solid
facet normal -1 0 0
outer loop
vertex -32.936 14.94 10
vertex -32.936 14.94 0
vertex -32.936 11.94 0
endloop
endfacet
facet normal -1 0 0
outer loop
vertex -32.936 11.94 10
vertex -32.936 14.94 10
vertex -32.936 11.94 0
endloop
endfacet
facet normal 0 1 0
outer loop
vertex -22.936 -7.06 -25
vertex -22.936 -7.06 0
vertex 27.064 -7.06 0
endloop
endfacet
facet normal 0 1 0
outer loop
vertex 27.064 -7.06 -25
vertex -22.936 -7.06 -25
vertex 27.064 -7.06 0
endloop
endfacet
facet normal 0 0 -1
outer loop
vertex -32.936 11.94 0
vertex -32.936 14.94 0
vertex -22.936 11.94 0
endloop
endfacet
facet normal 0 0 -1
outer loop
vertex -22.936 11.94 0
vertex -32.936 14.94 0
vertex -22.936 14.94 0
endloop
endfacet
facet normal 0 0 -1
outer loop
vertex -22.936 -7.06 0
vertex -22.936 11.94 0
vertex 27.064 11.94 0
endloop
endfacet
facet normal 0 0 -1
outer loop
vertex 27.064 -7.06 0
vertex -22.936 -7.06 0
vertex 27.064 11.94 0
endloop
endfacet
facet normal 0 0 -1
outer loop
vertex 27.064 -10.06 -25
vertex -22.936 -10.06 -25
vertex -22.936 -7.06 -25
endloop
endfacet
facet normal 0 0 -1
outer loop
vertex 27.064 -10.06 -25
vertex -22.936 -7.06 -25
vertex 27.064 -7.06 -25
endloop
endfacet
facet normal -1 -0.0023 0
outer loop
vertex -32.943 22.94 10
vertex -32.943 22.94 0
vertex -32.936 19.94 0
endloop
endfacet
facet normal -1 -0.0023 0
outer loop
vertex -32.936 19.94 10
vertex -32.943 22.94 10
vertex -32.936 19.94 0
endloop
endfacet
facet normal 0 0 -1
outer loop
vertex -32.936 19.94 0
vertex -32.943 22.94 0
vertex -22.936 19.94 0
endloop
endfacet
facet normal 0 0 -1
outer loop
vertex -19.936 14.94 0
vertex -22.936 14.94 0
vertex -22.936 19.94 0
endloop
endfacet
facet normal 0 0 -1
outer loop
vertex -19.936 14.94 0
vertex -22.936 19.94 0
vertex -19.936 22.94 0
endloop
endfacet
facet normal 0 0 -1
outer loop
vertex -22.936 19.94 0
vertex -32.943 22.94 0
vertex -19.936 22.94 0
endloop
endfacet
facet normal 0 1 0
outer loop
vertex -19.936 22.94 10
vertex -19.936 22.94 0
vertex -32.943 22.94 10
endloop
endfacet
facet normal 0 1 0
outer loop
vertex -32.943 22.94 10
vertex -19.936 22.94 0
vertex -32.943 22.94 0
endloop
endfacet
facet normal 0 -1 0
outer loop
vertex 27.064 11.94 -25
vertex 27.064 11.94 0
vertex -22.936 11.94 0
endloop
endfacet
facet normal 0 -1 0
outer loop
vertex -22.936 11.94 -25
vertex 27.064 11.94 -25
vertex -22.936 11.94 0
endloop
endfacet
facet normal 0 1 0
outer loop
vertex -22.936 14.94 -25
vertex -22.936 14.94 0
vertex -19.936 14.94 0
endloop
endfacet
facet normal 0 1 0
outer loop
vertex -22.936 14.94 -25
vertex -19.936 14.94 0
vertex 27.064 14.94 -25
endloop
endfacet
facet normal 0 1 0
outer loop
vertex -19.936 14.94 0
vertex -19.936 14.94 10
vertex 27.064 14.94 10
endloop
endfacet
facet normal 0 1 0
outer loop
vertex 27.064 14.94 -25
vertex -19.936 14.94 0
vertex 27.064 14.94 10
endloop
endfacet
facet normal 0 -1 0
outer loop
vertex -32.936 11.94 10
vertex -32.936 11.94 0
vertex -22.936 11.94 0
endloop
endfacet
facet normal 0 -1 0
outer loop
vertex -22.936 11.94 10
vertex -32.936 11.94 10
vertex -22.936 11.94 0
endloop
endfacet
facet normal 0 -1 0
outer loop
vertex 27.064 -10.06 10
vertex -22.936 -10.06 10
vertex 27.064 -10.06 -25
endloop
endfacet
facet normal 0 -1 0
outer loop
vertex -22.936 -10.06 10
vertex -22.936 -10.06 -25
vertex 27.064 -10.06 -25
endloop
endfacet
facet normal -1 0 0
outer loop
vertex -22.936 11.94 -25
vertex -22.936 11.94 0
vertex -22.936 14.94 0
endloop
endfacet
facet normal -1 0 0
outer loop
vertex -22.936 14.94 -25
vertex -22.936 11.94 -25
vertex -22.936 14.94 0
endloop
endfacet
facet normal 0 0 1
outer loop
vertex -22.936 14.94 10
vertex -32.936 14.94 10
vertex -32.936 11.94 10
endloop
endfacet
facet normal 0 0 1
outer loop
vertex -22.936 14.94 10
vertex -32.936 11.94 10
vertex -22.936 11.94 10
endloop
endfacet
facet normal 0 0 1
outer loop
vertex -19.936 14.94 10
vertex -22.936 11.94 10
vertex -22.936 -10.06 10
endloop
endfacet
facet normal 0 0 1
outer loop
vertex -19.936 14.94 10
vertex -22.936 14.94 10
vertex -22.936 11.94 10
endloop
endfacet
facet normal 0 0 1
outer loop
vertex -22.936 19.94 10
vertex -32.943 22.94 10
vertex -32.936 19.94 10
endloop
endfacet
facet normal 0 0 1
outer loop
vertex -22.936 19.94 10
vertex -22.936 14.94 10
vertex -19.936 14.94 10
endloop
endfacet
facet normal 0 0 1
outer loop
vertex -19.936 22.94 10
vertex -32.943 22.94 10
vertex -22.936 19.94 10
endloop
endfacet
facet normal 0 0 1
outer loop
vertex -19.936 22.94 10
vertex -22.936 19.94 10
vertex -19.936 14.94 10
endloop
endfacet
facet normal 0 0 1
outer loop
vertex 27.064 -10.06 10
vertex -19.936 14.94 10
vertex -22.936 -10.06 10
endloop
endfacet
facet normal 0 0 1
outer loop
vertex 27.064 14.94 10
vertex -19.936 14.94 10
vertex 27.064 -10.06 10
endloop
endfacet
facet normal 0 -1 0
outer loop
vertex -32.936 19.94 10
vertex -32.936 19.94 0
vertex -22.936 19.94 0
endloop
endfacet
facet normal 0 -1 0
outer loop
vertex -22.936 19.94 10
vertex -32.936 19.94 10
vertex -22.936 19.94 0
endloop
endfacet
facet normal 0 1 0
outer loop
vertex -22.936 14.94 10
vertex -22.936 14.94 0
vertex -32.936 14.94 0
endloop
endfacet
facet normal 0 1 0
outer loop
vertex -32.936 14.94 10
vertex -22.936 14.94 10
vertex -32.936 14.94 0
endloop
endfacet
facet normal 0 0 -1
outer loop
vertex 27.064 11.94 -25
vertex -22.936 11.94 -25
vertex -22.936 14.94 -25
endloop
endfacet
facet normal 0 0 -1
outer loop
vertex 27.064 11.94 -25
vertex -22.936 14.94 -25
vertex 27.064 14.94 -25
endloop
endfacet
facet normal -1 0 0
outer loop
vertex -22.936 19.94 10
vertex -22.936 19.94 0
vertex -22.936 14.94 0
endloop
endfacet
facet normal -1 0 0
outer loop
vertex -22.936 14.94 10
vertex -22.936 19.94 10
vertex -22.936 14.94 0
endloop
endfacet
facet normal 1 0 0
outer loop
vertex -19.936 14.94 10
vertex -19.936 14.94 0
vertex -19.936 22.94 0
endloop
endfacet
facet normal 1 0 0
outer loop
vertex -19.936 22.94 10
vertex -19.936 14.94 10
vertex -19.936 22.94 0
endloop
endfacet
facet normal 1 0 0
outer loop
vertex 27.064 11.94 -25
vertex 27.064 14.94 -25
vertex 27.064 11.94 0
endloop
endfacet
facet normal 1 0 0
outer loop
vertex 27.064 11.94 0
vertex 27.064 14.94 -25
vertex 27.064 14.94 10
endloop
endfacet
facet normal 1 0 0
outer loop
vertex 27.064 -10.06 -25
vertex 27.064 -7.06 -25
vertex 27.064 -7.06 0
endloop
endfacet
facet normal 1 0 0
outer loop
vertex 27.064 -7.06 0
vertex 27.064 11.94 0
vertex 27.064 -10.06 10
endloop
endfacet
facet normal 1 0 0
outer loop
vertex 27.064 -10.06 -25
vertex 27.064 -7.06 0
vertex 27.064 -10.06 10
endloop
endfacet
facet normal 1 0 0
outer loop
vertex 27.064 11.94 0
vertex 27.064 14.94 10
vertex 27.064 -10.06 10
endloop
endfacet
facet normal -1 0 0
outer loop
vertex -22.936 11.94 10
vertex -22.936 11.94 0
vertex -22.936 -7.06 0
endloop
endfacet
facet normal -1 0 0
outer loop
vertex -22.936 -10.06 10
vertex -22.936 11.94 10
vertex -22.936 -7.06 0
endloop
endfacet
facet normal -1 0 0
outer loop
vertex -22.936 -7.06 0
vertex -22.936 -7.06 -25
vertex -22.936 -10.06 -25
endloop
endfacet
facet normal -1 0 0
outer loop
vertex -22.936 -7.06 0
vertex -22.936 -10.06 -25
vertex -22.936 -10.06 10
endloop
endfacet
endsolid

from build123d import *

# Parameters (mm, degrees)
F1_DEPTH = 10
F2_W     = 50
F2_H     = 3
F3_DEPTH = 25


with BuildPart() as f1:
    # F0 (on Top) → F1 (new body)
    with BuildSketch(Plane.XY):
        Polygon((-32.9432, 22.939983), (-32.935701, 19.939983), (-22.935701, 19.939983), (-22.935701, 14.939983), (-32.935701, 14.939983), (-32.935701, 11.939982), (-22.935701, 11.939982), (-22.935701, -10.060017), (27.064299, -10.060017), (27.064299, 14.939983), (-19.9357, 14.939983), (-19.9357, 16.371092), (-19.9357, 22.939983), align=None)
    extrude(amount=F1_DEPTH)

    # F2 (on face) → F3 (join)
    with BuildSketch(Plane(origin=(0, 0, 0), x_dir=(1, 0, 0), z_dir=(0, 0, -1))):
        Polygon((27.064299, -11.939983), (-22.935701, -11.939983), (-22.935701, -14.939983), (-19.9357, -14.939983), (27.064299, -14.939983), align=None)
        with Locations((2.064299, 8.560017)):
            Rectangle(F2_W, F2_H)
    extrude(amount=F3_DEPTH)


solid = f1.part
